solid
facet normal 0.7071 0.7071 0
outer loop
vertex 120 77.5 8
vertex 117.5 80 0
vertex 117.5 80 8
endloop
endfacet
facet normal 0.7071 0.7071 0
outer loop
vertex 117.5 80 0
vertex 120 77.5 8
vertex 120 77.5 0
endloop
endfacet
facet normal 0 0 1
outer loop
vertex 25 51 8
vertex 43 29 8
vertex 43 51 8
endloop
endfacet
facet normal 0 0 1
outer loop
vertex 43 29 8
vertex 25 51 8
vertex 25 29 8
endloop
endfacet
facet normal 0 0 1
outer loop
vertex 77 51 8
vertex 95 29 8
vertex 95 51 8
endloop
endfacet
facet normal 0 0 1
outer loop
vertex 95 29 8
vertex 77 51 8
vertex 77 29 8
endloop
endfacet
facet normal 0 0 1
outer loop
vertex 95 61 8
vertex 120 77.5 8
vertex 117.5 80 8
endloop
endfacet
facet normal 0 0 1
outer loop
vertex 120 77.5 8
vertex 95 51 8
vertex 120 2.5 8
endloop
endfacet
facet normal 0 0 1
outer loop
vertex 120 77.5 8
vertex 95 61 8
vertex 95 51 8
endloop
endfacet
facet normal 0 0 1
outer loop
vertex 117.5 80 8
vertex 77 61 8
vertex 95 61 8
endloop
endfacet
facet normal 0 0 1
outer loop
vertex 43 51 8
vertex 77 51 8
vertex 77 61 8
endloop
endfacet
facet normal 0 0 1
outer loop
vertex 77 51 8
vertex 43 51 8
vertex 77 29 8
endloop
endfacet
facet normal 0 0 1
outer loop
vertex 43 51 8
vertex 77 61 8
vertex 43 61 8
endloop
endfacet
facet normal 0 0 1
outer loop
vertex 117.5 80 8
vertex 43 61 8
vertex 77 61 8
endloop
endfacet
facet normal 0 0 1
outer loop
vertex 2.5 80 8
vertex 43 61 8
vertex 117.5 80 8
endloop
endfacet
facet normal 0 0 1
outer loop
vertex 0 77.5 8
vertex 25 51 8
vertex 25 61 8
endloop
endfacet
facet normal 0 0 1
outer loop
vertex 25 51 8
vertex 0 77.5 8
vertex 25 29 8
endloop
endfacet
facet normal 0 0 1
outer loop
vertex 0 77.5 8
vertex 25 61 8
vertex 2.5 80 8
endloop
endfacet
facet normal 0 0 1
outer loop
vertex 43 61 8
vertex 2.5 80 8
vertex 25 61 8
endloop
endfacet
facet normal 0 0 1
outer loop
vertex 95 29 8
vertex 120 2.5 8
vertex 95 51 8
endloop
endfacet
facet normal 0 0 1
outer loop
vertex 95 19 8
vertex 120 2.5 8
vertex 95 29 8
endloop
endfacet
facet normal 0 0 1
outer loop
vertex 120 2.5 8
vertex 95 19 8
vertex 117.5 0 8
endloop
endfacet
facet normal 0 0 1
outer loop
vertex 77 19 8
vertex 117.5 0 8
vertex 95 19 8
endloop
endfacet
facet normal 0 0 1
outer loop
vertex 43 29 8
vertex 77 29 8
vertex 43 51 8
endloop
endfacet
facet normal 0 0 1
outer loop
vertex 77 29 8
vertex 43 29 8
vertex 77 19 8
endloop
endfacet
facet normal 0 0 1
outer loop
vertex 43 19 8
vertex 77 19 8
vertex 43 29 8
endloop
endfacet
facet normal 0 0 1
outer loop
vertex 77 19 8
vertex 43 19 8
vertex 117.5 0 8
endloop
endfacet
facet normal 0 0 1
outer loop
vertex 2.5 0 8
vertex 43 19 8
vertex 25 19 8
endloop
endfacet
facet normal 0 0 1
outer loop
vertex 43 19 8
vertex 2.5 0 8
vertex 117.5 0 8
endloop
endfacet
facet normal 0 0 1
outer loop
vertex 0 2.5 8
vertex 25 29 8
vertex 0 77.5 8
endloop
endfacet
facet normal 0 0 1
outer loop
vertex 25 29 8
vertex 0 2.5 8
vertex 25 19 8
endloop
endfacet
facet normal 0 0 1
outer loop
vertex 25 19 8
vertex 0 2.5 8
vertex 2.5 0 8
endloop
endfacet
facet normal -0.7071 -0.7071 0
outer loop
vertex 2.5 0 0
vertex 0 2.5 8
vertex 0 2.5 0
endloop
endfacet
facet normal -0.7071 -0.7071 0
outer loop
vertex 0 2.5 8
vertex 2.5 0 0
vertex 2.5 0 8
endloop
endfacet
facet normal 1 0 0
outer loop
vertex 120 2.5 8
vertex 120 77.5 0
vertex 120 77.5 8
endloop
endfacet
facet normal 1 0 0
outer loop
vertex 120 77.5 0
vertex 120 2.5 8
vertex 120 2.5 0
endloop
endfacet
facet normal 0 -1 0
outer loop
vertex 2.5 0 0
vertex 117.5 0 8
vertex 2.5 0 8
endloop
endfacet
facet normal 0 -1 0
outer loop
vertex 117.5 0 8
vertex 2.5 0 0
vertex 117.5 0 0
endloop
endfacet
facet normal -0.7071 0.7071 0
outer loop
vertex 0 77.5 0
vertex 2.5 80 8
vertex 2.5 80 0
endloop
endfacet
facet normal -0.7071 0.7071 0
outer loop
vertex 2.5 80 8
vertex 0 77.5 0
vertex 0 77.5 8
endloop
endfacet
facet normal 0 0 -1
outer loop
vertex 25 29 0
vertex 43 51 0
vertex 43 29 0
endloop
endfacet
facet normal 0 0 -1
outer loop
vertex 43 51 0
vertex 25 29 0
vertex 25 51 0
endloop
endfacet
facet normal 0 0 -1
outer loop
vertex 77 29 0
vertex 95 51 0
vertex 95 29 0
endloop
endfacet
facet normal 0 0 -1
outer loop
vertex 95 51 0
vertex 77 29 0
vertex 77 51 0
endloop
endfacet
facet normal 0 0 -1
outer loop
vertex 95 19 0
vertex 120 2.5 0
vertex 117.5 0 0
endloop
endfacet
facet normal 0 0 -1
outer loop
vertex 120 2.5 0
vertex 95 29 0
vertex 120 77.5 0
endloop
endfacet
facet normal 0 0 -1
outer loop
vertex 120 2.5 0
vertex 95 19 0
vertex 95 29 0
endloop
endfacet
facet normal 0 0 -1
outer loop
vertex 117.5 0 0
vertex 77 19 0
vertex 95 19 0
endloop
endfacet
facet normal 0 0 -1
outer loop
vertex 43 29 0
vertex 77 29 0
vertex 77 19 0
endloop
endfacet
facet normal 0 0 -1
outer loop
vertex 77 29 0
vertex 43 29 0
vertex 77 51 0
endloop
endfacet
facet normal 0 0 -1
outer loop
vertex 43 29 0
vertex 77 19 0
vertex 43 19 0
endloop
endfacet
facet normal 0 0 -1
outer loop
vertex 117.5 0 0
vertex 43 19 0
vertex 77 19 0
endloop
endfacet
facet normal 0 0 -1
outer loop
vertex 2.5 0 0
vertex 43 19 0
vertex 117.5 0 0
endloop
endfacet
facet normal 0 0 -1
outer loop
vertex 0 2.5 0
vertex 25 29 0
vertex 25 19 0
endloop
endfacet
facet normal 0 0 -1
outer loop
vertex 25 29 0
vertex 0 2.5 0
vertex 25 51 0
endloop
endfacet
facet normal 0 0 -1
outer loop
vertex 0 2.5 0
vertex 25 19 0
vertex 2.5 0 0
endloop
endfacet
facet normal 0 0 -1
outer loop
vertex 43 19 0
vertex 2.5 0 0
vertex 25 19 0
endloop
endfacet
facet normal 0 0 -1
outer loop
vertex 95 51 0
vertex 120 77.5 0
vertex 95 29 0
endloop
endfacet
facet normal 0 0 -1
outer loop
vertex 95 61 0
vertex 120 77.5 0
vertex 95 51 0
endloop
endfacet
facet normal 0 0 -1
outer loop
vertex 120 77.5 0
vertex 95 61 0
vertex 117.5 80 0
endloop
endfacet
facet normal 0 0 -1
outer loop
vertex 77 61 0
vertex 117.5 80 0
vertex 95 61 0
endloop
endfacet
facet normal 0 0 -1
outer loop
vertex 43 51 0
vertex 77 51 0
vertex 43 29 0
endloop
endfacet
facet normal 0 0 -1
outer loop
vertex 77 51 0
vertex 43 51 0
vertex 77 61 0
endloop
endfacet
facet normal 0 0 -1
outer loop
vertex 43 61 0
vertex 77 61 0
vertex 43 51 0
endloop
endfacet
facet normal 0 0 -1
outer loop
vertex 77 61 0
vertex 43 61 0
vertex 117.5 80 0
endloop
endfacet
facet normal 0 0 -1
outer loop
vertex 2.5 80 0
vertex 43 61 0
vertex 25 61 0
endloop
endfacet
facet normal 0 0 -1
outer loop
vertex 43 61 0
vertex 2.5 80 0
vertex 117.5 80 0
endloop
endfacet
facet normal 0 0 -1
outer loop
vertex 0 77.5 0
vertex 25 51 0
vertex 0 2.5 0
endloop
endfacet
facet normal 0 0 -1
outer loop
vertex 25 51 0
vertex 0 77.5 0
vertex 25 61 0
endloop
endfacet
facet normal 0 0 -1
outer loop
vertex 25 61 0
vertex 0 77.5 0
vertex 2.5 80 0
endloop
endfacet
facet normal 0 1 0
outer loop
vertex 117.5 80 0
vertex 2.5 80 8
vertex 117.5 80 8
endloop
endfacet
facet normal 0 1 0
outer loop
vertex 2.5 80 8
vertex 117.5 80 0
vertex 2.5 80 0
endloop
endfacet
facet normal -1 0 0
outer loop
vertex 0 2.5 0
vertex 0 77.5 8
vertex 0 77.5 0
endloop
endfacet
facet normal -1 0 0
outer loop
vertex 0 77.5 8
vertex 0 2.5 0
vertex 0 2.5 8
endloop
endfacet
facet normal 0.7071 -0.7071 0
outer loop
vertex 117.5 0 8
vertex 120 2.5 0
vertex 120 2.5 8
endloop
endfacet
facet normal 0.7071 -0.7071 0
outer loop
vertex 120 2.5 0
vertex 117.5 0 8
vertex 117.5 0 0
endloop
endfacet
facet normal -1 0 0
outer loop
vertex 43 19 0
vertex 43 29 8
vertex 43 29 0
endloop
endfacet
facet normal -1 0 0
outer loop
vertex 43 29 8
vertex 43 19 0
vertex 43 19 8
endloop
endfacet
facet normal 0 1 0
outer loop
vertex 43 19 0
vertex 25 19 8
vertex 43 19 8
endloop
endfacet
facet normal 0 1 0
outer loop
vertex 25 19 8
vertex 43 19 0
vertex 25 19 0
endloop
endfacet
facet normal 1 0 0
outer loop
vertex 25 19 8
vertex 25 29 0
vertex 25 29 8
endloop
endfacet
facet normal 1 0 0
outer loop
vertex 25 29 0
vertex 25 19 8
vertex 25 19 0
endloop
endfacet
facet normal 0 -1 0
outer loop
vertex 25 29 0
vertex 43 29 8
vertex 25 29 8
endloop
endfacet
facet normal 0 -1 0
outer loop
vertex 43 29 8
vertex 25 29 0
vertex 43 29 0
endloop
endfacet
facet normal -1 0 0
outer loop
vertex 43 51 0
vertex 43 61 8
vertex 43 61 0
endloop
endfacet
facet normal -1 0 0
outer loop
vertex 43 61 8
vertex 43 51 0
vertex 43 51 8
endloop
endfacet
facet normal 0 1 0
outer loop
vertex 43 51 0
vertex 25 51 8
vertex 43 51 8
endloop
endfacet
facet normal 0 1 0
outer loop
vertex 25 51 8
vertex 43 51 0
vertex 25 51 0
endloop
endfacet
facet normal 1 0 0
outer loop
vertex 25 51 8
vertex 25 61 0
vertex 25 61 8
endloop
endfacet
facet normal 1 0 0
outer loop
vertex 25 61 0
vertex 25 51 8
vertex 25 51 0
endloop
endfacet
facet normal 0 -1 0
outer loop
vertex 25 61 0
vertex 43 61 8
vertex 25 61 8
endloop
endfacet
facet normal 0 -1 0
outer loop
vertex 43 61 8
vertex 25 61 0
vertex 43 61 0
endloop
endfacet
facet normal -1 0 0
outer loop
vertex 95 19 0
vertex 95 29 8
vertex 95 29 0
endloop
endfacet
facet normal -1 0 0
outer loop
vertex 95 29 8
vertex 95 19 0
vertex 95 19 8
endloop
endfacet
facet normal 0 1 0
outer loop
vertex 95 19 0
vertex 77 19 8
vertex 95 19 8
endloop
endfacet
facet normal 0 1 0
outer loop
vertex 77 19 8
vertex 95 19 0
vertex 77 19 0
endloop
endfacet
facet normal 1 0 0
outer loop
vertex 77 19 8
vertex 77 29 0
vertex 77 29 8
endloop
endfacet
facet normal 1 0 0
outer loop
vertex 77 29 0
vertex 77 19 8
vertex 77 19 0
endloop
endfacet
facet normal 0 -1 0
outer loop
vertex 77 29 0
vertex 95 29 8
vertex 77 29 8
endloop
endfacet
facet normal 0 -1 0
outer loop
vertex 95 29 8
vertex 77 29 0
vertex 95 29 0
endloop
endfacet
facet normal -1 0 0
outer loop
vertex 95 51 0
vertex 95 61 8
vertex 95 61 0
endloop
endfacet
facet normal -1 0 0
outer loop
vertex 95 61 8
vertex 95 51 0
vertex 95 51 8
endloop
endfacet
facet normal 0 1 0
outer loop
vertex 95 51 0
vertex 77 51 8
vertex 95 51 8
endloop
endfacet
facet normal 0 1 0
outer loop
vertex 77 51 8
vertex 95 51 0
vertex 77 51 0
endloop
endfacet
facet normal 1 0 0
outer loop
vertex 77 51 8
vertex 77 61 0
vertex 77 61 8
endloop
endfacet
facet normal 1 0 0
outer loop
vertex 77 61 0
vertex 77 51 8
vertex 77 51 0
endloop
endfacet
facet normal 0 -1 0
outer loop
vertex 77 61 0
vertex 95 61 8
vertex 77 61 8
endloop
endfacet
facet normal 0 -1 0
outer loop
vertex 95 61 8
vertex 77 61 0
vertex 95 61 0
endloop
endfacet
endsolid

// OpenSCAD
$fn = 32;

// ----------------------------------------------------------------------
// Windowed plate: 4 voids, 120 x 80 x 8 mm
// ----------------------------------------------------------------------

// --- parameters (mm) ---
plate_l = 120;            // plate length, X
plate_w = 80;             // plate width, Y
plate_t = 8;              // plate thickness, Z
edge_margin = 8;          // wall from the plate edge to any window
win_l = 18;               // pocket length
win_w = 10;               // pocket width
pitch_x = 52;             // grid pitch along X
pitch_y = 32;             // grid pitch along Y
depth_1 = 8;              // depth of void 1 (full thickness = through)
depth_2 = 8;              // depth of void 2 (full thickness = through)
depth_3 = 8;              // depth of void 3 (full thickness = through)
depth_4 = 8;              // depth of void 4 (full thickness = through)
corner_c = 2.5;           // corner chamfer of the plate

profile = [[2.5, 0], [117.5, 0], [120, 2.5], [120, 77.5], [117.5, 80], [2.5, 80], [0, 77.5], [0, 2.5]];  // primary outline, 8 points, counter clockwise
void_1 = [[25, 19], [43, 19], [43, 29], [25, 29]];  // pocket at grid node 0,0, 4 points
void_2 = [[25, 51], [43, 51], [43, 61], [25, 61]];  // pocket at grid node 0,1, 4 points
void_3 = [[77, 19], [95, 19], [95, 29], [77, 29]];  // pocket at grid node 1,0, 4 points
void_4 = [[77, 51], [95, 51], [95, 61], [77, 61]];  // pocket at grid node 1,1, 4 points

// --- the one profile operation ---
difference() {
  linear_extrude(height = plate_t) polygon(points = profile);
  translate([0, 0, -1])
    linear_extrude(height = plate_t + 2) polygon(points = void_1);
  translate([0, 0, -1])
    linear_extrude(height = plate_t + 2) polygon(points = void_2);
  translate([0, 0, -1])
    linear_extrude(height = plate_t + 2) polygon(points = void_3);
  translate([0, 0, -1])
    linear_extrude(height = plate_t + 2) polygon(points = void_4);
}
